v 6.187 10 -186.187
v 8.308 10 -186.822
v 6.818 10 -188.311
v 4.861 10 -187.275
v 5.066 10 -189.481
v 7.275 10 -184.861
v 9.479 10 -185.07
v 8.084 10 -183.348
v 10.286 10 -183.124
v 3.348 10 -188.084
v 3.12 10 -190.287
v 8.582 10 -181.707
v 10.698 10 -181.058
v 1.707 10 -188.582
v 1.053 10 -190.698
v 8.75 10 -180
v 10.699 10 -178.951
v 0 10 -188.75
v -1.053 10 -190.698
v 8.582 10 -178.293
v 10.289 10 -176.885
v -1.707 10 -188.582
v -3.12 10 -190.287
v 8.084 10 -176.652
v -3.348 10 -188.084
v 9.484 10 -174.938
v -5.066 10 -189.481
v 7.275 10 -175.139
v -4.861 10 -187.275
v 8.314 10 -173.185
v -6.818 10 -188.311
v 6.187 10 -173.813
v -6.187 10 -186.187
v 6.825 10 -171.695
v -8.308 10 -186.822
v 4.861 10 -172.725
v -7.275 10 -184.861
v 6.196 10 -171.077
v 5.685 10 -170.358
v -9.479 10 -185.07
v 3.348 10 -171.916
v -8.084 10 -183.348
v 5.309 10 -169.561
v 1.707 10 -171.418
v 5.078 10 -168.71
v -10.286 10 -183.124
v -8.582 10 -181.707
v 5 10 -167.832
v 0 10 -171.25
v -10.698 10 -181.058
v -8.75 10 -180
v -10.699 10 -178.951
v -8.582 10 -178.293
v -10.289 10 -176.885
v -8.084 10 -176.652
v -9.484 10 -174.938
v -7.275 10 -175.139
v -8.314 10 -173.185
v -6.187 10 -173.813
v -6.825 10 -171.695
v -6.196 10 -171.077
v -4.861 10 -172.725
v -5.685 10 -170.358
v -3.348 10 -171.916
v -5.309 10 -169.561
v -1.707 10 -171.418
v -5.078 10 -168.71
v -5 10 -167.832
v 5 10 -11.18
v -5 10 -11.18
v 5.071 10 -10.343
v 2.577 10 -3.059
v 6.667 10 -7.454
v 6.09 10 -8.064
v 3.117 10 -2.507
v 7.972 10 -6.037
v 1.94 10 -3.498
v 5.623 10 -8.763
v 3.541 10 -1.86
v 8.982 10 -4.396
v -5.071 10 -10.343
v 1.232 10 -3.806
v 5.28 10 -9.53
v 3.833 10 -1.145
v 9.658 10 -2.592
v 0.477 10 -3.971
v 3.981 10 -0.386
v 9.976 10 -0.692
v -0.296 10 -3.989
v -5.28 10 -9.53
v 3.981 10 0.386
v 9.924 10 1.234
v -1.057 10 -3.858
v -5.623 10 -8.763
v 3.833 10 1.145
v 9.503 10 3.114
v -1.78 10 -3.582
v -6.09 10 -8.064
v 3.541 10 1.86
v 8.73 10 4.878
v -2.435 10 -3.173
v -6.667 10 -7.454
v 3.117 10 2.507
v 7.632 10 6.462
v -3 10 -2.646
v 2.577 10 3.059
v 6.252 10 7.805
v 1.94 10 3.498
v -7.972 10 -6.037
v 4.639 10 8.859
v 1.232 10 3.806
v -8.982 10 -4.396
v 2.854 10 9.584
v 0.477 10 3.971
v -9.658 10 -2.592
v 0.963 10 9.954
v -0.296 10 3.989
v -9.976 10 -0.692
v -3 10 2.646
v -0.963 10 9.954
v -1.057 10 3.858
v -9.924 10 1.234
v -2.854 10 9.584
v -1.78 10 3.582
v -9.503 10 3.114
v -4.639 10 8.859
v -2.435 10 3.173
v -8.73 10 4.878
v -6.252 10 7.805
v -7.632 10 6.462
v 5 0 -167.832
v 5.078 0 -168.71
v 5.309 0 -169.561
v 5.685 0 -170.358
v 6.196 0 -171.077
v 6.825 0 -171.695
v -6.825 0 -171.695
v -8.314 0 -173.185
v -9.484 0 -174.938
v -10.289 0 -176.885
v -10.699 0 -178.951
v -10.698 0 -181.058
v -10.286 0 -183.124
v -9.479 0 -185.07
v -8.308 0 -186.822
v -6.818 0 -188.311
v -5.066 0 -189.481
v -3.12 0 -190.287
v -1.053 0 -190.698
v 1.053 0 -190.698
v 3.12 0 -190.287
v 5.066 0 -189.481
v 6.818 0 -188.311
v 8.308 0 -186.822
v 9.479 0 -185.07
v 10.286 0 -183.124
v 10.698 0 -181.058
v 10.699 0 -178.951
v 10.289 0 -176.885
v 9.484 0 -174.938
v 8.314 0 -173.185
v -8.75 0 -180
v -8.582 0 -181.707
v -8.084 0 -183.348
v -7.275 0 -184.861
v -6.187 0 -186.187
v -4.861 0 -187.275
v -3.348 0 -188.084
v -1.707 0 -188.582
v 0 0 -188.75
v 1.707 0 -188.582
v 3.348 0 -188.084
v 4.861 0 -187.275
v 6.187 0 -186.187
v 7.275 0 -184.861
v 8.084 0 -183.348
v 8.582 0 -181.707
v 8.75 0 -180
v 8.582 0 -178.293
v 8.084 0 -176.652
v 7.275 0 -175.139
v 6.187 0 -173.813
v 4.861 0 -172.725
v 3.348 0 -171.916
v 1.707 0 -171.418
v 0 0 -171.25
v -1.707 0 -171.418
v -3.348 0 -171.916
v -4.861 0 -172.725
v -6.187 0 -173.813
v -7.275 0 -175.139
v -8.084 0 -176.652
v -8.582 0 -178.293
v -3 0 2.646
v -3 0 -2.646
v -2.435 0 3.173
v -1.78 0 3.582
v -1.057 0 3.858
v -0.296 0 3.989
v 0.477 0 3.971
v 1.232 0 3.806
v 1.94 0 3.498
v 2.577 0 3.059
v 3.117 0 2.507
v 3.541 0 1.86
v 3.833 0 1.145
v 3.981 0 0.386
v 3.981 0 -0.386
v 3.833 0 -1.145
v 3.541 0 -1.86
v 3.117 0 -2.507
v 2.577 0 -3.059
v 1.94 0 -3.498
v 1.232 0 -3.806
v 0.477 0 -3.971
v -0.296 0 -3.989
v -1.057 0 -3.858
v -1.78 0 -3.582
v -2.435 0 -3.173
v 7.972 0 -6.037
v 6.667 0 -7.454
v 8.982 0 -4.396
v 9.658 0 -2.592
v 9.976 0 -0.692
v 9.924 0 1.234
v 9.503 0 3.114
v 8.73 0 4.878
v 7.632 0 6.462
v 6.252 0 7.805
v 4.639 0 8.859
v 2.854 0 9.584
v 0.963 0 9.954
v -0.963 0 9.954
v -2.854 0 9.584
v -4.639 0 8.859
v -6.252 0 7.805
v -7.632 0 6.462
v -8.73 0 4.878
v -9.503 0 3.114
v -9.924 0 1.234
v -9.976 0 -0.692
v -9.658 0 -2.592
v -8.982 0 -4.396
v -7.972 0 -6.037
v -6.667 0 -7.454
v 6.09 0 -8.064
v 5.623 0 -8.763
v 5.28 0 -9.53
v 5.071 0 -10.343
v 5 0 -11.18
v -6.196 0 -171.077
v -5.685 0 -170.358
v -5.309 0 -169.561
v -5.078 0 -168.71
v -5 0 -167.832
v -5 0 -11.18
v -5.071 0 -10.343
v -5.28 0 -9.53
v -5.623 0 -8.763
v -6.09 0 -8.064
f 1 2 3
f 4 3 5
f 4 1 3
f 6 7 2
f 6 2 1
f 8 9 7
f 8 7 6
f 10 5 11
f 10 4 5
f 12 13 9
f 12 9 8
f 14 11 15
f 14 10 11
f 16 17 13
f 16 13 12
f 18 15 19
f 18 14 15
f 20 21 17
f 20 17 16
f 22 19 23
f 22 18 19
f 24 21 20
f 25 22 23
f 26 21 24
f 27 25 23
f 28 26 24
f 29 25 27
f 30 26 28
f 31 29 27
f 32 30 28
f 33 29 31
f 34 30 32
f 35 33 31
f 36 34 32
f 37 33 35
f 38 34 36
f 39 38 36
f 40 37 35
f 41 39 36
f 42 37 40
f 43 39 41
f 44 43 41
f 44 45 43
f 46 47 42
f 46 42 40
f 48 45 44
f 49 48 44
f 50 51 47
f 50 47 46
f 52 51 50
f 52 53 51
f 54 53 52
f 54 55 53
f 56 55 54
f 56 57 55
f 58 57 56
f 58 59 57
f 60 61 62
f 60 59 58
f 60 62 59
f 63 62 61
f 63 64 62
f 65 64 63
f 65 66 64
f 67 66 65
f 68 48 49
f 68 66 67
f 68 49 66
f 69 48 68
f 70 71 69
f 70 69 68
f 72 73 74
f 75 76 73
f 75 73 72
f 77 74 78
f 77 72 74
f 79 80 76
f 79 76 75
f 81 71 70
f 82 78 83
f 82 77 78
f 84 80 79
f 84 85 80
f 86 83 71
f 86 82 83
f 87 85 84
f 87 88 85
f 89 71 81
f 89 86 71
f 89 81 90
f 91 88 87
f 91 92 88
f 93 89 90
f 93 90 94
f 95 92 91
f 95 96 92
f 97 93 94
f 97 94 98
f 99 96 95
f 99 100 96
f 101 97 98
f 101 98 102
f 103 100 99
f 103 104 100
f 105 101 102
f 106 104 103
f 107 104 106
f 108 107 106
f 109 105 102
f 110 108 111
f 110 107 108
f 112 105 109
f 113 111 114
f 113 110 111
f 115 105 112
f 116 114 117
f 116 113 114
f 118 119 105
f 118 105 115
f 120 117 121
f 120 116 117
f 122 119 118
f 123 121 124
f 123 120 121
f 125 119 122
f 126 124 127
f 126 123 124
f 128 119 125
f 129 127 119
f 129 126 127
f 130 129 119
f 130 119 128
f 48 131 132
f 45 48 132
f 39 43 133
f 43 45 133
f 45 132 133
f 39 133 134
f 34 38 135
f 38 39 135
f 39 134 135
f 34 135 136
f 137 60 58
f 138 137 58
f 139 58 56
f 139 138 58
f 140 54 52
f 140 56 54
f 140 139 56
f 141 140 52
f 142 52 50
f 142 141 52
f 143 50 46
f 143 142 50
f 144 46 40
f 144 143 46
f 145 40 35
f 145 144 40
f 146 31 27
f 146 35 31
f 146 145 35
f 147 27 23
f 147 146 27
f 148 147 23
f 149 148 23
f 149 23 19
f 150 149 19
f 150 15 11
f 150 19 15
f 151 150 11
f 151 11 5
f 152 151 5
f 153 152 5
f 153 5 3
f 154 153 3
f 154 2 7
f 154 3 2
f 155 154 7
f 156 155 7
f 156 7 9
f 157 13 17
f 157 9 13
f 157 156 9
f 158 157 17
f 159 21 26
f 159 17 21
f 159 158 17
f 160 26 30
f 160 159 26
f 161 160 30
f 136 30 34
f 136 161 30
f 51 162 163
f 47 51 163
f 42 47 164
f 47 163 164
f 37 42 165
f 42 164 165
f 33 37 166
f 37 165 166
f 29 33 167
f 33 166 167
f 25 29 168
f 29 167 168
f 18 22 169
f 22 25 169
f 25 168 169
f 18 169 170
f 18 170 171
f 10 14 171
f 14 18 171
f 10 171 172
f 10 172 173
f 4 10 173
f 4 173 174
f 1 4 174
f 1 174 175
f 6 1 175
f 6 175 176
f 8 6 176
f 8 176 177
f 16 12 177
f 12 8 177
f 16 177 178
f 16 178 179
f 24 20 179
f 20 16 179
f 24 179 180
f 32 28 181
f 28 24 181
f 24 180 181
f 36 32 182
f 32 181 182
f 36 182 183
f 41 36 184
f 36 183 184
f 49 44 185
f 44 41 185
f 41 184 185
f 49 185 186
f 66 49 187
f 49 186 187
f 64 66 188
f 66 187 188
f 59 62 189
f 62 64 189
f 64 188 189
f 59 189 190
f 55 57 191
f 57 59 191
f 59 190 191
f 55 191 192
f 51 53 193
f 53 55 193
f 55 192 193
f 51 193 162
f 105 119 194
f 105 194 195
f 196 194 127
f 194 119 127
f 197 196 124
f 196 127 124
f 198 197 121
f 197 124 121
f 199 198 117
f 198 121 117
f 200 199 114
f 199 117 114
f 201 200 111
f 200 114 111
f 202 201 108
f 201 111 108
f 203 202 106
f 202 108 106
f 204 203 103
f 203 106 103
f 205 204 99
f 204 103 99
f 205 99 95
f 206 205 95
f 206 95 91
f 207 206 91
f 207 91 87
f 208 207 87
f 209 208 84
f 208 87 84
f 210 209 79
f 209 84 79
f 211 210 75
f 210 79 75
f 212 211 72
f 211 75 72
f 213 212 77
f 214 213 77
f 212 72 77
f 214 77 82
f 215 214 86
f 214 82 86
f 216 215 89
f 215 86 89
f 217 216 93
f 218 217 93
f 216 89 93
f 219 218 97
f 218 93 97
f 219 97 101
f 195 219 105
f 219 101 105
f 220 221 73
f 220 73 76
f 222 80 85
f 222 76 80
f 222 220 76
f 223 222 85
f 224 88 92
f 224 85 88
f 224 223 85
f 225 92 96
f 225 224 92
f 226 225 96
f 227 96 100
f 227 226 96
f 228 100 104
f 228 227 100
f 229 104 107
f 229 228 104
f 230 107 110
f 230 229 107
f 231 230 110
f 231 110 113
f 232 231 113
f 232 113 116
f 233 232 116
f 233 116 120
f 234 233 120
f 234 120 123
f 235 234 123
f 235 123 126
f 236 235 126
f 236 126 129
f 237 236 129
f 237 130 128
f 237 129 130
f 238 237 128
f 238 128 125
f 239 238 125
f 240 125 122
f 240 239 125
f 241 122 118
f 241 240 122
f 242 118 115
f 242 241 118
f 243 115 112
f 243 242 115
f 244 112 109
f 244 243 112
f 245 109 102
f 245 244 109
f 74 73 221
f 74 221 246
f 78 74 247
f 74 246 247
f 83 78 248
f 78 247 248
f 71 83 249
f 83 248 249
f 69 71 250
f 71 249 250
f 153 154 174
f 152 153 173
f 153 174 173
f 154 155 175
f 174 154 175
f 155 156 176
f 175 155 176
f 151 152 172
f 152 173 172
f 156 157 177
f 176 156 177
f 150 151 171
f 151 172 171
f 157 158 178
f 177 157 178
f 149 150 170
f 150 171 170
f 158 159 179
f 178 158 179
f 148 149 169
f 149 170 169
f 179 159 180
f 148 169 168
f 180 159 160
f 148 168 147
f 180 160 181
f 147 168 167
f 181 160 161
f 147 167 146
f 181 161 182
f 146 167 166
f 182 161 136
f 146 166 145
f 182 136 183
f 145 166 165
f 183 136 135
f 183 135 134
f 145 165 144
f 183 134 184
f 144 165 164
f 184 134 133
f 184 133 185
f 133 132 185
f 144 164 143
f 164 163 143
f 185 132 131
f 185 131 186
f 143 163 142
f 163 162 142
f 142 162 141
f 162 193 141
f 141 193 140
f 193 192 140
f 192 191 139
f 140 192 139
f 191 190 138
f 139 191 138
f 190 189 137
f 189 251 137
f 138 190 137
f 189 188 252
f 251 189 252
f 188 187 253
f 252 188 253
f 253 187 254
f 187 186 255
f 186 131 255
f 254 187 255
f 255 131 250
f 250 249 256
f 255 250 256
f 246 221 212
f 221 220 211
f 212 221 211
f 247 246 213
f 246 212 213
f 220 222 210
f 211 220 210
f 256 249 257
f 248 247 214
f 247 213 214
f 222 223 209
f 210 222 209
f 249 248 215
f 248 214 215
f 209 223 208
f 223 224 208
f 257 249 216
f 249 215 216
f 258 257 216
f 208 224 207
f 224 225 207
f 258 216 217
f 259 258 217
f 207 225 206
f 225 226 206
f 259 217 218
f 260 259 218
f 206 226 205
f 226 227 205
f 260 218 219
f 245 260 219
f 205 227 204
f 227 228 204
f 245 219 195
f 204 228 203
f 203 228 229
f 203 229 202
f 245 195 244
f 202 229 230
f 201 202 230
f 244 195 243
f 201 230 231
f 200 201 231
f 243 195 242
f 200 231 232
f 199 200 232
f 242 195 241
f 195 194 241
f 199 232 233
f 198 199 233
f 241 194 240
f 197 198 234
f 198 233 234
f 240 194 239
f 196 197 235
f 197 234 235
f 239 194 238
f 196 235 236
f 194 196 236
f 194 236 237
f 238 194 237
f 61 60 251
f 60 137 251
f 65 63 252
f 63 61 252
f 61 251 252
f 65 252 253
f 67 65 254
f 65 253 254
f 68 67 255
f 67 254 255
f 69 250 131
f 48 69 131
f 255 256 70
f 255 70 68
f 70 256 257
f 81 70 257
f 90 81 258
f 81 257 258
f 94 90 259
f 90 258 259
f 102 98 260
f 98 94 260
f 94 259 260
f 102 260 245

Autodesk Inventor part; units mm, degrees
ref_plane "YZ Plane" through (0, 0, 0) normal (1, 0, 0) x (0, 1, 0)
ref_plane "XZ Plane" through (0, 0, 0) normal (0, 1, 0) x (-1, 0, 0)
ref_plane "XY Plane" through (0, 0, 0) normal (0, 0, 1) x (1, 0, 0)
sketch "Boceto2" plane through (0, 0, 0) normal (0, 1, 0) x (-1, 0, 0)
  arc A0 (5, 0) -> (-5, 0) centre (0, 0) ccw
  arc A1 (1.2, 2.1932) -> (1.2, -2.1932) centre (0, 0) ccw
  line L0 (1.2, 2.1932) -> (1.2, -2.1932)
  line L1 (0, 0) -> (0, -180) construction
  circle A2 centre (0, -180) radius 8.75
  arc A3 (-6.8254, -171.6948) -> (6.8254, -171.6948) centre (0, -180) ccw
  line L2 (5, -11.1803) -> (5, -167.8319)
  line L3 (-5, -11.1803) -> (-5, -167.8319)
  arc A4 (-6.8254, -171.6948) -> (-5, -167.8319) centre (-10, -167.8319) ccw
  arc A5 (5, -167.8319) -> (6.8254, -171.6948) centre (10, -167.8319) ccw
  arc A6 (6.6667, -7.4536) -> (-6.6667, -7.4536) centre (0, 0) ccw
  arc A7 (6.6667, -7.4536) -> (5, -11.1803) centre (10, -11.1803) ccw
  arc A8 (-5, -11.1803) -> (-6.6667, -7.4536) centre (-10, -11.1803) ccw
  point P0 (-5, -170.4836)
  point P1 (5, -170.4836)
  point P2 (5, -8.6603)
  point P3 (-5, -8.6603)
  dimension "d13" = 10
  dimension "d14" = 5
  dimension "d15" = 1.2
  dimension "d16" = 180
  dimension "d17" = 17.5
  dimension "d18" = 2
  dimension "d19" = 5
  dimension "d27" = 20
  dimension "d28" = 5
  dimension "d29" = 5
extrude "Extrusión2" add sketch "Boceto2" along normal blind 10
sketch "Boceto3" plane through (0, 10, 0) normal (0, 1, 0) x (1, 0, 0)
  circle A0 centre (0, 0) radius 4
  line L0 (-3, -2.6458) -> (-3, 2.6458)
  line L1 (-3, -2.6458) -> (4.3142, -2.6458) construction
  dimension "d22" = 8
  dimension "d25" = 90
  dimension "d26" = 3
extrude "Extrusión3" cut sketch "Boceto3" against normal blind 10 contours A0 L0 picked at (0.3596, 0.8073)
properties part number "eslabon2"
